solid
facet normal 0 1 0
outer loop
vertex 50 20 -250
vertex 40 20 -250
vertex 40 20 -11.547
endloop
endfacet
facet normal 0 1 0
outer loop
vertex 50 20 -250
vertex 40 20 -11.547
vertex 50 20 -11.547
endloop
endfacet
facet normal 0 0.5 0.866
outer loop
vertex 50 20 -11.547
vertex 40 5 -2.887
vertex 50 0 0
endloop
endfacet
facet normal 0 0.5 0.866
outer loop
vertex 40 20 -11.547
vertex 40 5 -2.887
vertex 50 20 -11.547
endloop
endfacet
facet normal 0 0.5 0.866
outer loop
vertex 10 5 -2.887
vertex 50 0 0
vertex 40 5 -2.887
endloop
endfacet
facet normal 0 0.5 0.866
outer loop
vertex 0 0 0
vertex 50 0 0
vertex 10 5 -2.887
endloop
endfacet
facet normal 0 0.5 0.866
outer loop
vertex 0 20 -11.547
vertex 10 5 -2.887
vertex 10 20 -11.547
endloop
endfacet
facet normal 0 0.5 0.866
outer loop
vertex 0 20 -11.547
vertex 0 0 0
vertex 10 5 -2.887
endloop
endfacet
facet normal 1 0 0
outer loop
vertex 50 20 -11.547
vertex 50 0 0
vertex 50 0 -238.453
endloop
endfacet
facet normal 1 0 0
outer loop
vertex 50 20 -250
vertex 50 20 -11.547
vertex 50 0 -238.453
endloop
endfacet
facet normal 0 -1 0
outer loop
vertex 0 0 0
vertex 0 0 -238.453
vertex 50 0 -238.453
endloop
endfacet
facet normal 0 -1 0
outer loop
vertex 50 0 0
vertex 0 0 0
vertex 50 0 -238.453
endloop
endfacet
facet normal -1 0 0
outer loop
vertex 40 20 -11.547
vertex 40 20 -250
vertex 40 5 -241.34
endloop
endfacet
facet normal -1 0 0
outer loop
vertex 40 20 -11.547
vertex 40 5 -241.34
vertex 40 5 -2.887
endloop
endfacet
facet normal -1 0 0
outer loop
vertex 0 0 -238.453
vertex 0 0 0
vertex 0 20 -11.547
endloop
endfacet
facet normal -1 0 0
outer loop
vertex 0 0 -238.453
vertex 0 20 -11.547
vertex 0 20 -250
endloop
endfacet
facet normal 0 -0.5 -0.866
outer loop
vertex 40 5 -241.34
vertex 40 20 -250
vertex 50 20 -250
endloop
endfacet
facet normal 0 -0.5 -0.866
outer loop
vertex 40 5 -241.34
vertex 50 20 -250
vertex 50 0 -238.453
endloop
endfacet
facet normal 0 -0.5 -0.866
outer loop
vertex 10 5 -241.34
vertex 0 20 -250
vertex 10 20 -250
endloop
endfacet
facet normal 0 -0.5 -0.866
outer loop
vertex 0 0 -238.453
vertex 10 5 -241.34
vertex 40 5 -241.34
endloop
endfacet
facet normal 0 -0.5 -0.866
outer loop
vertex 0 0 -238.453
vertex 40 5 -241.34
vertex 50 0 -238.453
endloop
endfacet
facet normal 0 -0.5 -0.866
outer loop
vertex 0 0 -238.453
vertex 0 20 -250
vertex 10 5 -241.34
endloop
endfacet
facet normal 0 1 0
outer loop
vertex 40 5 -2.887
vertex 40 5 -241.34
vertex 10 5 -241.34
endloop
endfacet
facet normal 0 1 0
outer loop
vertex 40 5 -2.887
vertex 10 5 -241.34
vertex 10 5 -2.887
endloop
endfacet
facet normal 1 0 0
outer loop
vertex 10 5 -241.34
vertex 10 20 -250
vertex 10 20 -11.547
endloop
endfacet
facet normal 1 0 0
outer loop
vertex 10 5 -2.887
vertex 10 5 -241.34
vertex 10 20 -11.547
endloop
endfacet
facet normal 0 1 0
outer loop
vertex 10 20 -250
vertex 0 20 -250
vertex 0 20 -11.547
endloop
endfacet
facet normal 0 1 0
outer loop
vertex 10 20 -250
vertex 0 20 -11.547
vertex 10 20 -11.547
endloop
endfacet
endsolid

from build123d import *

# Parameters (mm, degrees)
SKETCH2_W               = 50
SKETCH2_H               = 250
BOSS_EXTRUDE1_DEPTH     = 20
CUT_EXTRUDE1_DEPTH      = 256.734237051
CUT_EXTRUDE1_DEPTH_BACK = 256.734237051
SKETCH3_OUTSIDE_W       = 303.146
SKETCH3_OUTSIDE_H       = 73.146
CUT_EXTRUDE2_START      = -10
CUT_EXTRUDE2_DEPTH      = 30


with BuildPart() as part:
    # Sketch2 → Boss-Extrude1 (new body)
    with BuildSketch(Plane(origin=(0, 0, 0), x_dir=(1, 0, 0), z_dir=(0, 1, 0))):
        with Locations((25, 125)):
            Rectangle(SKETCH2_W, SKETCH2_H)
    extrude(amount=BOSS_EXTRUDE1_DEPTH)

    # Sketch3 outside → Cut-Extrude1 (cut, two sides: drawn at the far end of the back side and taken through both)
    with BuildSketch(Plane(origin=(50, 0, 0), x_dir=(0, 0, -1), z_dir=(1, 0, 0)).offset(-CUT_EXTRUDE1_DEPTH_BACK)):
        with Locations((125, 10)):
            Rectangle(SKETCH3_OUTSIDE_W, SKETCH3_OUTSIDE_H)
        Polygon((0, 0), (11.547005384, 20), (250, 20), (238.452994616, 0), align=None, mode=Mode.SUBTRACT)
    extrude(amount=CUT_EXTRUDE1_DEPTH + CUT_EXTRUDE1_DEPTH_BACK, mode=Mode.SUBTRACT)

    # Sketch4 → Cut-Extrude2 (cut)
    with BuildSketch(Plane(origin=(50, 0, 0), x_dir=(0, 0, -1), z_dir=(1, 0, 0)).offset(CUT_EXTRUDE2_START)):
        Polygon((11.547005384, 20), (250, 20), (241.339745962, 5), (2.886751346, 5), align=None)
    extrude(amount=-CUT_EXTRUDE2_DEPTH, mode=Mode.SUBTRACT)


solid = part.part
